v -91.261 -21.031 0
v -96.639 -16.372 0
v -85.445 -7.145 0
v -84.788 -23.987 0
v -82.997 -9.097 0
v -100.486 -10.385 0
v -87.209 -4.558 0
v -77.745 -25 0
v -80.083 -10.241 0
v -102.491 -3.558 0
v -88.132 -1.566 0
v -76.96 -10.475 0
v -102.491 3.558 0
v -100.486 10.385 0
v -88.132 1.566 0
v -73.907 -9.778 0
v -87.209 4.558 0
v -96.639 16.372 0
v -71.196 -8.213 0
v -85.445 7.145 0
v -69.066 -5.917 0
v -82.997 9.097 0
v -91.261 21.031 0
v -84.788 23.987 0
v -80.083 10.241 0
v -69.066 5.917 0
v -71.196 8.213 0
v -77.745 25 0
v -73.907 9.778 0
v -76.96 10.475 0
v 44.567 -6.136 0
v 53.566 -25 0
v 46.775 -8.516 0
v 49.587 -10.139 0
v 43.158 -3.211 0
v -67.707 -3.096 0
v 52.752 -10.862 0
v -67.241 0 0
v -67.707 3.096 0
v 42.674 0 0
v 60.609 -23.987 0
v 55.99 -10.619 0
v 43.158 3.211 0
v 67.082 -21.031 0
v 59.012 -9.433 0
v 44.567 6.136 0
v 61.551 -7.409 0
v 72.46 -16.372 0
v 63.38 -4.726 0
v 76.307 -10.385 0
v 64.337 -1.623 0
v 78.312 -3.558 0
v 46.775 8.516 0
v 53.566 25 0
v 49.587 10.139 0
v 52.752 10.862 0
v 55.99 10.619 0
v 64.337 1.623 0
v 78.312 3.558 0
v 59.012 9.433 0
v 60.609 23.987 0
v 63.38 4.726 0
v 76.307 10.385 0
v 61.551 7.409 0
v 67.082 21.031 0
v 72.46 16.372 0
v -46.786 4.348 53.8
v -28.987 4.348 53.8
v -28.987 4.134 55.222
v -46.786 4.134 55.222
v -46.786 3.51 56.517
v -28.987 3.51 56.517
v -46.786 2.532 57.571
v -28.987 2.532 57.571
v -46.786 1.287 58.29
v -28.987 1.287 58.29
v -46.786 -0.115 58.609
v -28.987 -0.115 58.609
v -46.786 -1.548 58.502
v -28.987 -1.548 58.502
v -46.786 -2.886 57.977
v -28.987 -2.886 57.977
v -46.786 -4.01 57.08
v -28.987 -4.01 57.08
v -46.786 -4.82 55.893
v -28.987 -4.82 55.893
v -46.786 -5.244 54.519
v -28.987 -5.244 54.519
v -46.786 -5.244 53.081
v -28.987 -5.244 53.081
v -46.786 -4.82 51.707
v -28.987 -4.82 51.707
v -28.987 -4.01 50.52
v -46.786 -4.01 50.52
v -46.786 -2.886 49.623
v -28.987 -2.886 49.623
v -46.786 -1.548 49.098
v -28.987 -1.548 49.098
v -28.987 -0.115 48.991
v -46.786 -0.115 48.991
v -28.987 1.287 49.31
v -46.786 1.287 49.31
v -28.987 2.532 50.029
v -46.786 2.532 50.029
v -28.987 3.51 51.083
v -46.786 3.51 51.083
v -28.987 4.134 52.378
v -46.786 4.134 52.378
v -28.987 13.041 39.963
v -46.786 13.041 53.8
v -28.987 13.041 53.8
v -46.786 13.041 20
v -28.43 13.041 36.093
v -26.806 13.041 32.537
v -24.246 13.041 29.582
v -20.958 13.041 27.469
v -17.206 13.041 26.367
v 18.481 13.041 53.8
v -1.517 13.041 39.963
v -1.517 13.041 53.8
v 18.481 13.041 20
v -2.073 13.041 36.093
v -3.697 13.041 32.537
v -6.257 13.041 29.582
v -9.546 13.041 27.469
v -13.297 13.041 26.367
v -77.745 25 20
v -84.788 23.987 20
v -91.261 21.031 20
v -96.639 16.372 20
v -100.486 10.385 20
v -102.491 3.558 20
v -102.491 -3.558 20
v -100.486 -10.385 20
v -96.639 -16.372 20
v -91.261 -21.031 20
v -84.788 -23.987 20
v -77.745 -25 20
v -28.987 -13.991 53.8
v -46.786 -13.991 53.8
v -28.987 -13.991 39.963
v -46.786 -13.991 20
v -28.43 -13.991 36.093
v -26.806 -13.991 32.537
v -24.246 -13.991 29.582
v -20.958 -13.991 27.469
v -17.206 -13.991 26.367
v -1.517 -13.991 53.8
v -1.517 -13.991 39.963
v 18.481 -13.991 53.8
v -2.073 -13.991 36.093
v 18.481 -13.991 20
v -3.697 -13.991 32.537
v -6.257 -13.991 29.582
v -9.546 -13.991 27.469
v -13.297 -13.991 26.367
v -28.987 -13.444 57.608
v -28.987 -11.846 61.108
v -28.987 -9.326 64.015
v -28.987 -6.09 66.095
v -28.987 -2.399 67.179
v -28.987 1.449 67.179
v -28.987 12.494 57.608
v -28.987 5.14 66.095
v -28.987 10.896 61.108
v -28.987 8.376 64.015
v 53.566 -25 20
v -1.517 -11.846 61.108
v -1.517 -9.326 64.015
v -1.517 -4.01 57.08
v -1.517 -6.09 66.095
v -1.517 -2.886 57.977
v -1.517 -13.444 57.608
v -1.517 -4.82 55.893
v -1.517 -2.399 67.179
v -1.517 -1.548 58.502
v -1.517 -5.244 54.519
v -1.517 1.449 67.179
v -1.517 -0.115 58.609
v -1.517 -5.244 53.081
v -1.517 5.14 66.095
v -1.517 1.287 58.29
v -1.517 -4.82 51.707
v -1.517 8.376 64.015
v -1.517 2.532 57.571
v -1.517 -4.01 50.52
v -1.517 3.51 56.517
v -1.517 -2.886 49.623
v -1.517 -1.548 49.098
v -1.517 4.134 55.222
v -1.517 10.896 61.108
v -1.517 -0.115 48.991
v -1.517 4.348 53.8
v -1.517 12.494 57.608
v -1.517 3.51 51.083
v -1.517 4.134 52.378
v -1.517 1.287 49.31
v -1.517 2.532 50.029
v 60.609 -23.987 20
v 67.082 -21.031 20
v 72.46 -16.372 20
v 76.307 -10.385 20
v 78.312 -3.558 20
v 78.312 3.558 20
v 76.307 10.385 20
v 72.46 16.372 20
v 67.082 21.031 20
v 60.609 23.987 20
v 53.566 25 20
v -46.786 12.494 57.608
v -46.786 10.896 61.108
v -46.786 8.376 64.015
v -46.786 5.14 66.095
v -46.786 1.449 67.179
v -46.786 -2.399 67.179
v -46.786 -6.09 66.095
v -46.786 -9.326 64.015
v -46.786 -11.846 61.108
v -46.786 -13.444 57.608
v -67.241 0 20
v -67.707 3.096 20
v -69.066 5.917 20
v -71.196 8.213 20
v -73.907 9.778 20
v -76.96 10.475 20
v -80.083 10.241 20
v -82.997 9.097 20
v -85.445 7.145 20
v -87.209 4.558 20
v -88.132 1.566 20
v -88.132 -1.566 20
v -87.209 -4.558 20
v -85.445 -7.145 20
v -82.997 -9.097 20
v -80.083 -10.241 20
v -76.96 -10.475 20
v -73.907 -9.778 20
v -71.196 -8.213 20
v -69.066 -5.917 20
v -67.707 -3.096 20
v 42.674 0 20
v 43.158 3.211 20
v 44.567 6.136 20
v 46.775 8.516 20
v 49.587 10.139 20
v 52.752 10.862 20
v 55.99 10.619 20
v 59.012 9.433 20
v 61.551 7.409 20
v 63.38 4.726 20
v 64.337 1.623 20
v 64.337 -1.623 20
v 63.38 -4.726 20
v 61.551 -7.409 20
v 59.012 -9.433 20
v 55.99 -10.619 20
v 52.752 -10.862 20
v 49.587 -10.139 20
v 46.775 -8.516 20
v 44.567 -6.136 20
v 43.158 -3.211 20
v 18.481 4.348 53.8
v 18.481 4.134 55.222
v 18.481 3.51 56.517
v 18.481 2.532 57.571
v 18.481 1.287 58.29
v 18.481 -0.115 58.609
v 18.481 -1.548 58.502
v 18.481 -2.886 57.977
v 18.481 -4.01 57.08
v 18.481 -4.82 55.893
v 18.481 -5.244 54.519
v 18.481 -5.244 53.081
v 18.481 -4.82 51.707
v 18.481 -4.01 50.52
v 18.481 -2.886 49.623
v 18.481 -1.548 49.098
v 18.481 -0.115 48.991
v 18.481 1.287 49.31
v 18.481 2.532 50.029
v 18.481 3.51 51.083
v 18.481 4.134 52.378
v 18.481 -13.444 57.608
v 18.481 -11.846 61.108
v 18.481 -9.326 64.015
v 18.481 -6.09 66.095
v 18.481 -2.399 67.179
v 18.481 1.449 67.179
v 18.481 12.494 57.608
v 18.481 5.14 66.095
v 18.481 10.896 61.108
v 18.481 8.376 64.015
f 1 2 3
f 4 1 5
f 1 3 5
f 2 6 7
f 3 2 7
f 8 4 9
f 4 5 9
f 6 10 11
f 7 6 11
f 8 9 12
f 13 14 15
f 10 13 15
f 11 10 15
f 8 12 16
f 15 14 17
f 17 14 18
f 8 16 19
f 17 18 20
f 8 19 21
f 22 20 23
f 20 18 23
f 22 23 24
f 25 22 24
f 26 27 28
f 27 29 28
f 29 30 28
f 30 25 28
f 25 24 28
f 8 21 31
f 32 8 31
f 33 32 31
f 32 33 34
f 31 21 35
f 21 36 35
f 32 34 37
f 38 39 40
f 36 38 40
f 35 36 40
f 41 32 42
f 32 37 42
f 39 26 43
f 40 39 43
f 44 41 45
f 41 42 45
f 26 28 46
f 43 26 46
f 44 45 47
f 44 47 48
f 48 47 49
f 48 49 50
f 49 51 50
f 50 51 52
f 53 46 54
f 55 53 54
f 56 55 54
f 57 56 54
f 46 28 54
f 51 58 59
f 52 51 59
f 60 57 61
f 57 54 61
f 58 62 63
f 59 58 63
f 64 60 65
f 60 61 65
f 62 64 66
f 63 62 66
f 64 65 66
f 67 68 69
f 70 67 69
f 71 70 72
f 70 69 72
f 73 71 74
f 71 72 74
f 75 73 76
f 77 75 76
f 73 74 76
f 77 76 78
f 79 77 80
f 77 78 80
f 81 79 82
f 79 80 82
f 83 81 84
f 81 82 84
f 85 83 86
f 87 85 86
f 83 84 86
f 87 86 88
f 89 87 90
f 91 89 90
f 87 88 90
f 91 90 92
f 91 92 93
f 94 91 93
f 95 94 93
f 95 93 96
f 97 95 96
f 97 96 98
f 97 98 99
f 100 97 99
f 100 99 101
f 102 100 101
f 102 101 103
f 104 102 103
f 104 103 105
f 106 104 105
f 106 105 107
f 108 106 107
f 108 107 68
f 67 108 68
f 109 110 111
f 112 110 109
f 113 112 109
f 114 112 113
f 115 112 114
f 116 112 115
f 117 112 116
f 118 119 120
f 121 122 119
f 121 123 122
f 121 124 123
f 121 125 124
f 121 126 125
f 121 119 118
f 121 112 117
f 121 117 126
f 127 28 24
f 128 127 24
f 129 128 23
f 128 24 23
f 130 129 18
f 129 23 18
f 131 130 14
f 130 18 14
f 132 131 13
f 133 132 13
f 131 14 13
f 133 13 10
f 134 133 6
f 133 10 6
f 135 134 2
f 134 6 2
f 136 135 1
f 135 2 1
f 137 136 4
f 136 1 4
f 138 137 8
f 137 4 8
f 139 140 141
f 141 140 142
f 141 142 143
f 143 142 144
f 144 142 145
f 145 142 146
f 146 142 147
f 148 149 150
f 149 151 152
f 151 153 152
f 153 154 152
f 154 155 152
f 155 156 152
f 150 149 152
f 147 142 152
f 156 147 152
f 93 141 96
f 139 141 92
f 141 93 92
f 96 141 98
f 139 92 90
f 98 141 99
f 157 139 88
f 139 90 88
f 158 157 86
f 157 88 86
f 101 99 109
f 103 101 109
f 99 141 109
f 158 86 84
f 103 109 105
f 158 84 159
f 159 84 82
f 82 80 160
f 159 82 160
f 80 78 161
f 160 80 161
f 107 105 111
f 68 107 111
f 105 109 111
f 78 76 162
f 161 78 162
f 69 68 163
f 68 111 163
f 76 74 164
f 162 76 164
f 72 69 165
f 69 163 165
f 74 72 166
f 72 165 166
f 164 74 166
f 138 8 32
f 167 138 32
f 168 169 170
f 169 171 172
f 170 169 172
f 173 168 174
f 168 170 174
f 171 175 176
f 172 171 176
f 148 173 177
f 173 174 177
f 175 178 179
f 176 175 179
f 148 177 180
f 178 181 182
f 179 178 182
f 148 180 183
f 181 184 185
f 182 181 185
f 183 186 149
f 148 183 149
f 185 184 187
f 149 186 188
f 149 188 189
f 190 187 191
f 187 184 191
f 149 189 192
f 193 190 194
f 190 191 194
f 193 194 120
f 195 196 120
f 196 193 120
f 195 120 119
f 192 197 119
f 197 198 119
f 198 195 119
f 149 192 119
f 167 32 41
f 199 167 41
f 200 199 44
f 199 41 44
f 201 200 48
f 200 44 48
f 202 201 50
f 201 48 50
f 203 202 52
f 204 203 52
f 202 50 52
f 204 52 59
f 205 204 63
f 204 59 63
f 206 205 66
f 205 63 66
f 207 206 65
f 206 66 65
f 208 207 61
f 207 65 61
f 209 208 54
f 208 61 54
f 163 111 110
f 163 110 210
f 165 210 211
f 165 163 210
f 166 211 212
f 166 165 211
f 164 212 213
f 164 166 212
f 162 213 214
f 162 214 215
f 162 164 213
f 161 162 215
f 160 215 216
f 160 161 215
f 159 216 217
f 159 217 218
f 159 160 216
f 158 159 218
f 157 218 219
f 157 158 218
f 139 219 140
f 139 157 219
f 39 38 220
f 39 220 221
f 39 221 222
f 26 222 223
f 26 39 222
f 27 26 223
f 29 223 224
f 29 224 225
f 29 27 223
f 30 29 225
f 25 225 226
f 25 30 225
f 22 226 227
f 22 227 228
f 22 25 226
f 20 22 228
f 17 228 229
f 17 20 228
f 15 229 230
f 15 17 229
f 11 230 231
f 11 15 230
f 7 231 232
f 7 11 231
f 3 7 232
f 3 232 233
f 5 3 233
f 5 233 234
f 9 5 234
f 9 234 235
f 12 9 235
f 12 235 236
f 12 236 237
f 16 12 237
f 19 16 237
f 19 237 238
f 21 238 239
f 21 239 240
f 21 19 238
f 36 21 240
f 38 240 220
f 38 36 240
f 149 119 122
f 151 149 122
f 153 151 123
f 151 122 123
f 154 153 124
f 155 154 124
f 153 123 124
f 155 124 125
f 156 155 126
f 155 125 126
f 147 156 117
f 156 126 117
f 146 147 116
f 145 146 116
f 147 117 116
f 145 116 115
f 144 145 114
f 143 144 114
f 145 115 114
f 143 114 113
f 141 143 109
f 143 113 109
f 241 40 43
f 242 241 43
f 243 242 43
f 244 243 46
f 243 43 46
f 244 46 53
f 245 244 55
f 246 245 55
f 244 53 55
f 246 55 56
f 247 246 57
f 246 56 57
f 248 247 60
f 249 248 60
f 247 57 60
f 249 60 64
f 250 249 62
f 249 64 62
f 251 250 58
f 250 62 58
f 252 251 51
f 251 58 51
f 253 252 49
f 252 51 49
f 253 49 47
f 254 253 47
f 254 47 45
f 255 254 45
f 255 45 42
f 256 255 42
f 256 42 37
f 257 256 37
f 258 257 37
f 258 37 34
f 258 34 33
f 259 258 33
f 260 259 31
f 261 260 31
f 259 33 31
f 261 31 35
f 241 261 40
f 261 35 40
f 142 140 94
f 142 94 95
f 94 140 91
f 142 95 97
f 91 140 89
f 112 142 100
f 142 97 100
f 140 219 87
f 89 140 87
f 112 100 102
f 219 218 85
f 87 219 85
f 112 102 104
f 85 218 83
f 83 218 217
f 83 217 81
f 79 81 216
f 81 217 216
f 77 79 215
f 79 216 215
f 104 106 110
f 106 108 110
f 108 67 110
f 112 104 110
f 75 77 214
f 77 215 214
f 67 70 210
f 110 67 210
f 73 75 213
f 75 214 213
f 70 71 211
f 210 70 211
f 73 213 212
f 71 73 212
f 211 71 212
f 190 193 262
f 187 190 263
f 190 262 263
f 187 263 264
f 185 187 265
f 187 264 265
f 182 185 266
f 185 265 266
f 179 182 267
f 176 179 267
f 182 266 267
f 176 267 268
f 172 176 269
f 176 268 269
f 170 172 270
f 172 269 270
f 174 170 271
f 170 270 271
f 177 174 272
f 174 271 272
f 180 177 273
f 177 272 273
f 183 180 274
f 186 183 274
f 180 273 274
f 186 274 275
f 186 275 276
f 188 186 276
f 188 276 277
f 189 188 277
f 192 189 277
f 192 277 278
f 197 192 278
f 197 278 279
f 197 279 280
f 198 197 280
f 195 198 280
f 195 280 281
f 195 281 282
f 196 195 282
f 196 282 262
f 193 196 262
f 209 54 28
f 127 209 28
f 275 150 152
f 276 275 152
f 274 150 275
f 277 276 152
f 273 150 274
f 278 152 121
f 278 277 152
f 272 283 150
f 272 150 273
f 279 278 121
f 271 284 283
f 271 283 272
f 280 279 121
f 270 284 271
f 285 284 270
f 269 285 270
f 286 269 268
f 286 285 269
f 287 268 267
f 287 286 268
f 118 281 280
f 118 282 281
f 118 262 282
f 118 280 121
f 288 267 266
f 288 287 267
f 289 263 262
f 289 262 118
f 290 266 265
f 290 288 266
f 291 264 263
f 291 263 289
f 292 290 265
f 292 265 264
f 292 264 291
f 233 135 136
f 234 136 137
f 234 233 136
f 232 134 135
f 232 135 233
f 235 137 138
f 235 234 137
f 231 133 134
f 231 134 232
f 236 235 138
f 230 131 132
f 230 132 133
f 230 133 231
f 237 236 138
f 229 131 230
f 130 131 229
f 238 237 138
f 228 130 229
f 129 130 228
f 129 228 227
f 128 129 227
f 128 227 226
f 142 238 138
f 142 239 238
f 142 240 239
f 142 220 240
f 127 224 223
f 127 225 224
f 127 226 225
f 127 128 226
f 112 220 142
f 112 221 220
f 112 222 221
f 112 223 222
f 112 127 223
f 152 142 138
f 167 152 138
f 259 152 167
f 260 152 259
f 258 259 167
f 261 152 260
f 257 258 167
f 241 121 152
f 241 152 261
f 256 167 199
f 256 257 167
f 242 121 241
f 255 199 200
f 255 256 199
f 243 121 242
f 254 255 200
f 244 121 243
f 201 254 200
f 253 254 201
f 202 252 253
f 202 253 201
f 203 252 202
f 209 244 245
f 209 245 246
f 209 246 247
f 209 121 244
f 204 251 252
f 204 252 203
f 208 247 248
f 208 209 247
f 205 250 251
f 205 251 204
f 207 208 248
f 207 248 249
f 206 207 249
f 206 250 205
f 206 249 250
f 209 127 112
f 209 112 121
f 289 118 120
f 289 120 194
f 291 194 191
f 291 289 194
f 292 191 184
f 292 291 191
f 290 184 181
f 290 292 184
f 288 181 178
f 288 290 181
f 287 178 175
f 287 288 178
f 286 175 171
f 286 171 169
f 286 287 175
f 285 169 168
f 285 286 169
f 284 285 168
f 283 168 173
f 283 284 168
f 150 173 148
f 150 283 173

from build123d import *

# Parameters (mm, degrees)
F0_R     = 10.5045071993
F1_DEPTH = 20
F2_W     = 65.2672518045
F2_H     = 27.032835409
F3_DEPTH = 33.8
F5_DEPTH = 65.2672518045
F6_R     = 4.8229033698
F7_DEPTH = 121.2269564549
F9_DEPTH = 38.0423929


with BuildPart() as f1:
    # F0 (on Top) → F1 (new body)
    with BuildSketch(Plane.XY):
        with BuildLine():
            ThreePointArc((-77.745065093, 25), (-102.745065093, 0), (-77.745065093, -25))
            Line((-77.745065093, -25), (53.5661391914, -25))
            ThreePointArc((53.5661391914, -25), (78.5661391914, 0), (53.5661391914, 25))
            Line((53.5661391914, 25), (-77.745065093, 25))
        make_face()
        with Locations((-77.745065093, 0)):
            Circle(F0_R, mode=Mode.SUBTRACT)
        with BuildLine():
            ThreePointArc((64.4582820553, 0), (53.5661391914, -10.8921428639), (42.6739963275, 0))
            ThreePointArc((42.6739963275, 0), (53.5661391914, 10.8921428639), (64.4582820553, 0))
        make_face(mode=Mode.SUBTRACT)
    extrude(amount=F1_DEPTH)

    # F2 (on face) → F3 (join)
    with BuildSketch(Plane.XY.offset(20)):
        with Locations((-14.1527345404, -0.4750248045)):
            Rectangle(F2_W, F2_H)
    extrude(amount=F3_DEPTH)

    # F4 (on face) → F5 (join, through all)
    with BuildSketch(Plane.YZ.offset(18.4808913618)):
        with BuildLine():
            Line((-13.991442509, 53.8), (13.0413929, 53.8))
            ThreePointArc((13.0413929, 53.8), (-0.4750248045, 67.3164177045), (-13.991442509, 53.8))
        make_face()
    extrude(amount=-F5_DEPTH)

    # F6 (on face) → F7 (cut, through all)
    with BuildSketch(Plane.YZ.offset(18.4808913618)):
        with Locations((-0.4750248045, 53.8)):
            Circle(F6_R)
    extrude(amount=-F7_DEPTH, mode=Mode.SUBTRACT)

    # F8 (on face) → F9 (cut, through all)
    with BuildSketch(Plane(origin=(0, 13.0413929, 0), x_dir=(-1, 0, 0), z_dir=(0, 1, 0))):
        with BuildLine():
            Line((28.9868507534, 71.8440338969), (1.5166216763, 71.8440338969))
            Line((1.5166216763, 71.8440338969), (1.5166216763, 39.9625226855))
            ThreePointArc((1.5166216763, 39.9625226855), (15.2517362149, 26.227408147), (28.9868507534, 39.9625226855))
            Line((28.9868507534, 39.9625226855), (28.9868507534, 71.8440338969))
        make_face()
    extrude(amount=-F9_DEPTH, mode=Mode.SUBTRACT)


solid = f1.part
